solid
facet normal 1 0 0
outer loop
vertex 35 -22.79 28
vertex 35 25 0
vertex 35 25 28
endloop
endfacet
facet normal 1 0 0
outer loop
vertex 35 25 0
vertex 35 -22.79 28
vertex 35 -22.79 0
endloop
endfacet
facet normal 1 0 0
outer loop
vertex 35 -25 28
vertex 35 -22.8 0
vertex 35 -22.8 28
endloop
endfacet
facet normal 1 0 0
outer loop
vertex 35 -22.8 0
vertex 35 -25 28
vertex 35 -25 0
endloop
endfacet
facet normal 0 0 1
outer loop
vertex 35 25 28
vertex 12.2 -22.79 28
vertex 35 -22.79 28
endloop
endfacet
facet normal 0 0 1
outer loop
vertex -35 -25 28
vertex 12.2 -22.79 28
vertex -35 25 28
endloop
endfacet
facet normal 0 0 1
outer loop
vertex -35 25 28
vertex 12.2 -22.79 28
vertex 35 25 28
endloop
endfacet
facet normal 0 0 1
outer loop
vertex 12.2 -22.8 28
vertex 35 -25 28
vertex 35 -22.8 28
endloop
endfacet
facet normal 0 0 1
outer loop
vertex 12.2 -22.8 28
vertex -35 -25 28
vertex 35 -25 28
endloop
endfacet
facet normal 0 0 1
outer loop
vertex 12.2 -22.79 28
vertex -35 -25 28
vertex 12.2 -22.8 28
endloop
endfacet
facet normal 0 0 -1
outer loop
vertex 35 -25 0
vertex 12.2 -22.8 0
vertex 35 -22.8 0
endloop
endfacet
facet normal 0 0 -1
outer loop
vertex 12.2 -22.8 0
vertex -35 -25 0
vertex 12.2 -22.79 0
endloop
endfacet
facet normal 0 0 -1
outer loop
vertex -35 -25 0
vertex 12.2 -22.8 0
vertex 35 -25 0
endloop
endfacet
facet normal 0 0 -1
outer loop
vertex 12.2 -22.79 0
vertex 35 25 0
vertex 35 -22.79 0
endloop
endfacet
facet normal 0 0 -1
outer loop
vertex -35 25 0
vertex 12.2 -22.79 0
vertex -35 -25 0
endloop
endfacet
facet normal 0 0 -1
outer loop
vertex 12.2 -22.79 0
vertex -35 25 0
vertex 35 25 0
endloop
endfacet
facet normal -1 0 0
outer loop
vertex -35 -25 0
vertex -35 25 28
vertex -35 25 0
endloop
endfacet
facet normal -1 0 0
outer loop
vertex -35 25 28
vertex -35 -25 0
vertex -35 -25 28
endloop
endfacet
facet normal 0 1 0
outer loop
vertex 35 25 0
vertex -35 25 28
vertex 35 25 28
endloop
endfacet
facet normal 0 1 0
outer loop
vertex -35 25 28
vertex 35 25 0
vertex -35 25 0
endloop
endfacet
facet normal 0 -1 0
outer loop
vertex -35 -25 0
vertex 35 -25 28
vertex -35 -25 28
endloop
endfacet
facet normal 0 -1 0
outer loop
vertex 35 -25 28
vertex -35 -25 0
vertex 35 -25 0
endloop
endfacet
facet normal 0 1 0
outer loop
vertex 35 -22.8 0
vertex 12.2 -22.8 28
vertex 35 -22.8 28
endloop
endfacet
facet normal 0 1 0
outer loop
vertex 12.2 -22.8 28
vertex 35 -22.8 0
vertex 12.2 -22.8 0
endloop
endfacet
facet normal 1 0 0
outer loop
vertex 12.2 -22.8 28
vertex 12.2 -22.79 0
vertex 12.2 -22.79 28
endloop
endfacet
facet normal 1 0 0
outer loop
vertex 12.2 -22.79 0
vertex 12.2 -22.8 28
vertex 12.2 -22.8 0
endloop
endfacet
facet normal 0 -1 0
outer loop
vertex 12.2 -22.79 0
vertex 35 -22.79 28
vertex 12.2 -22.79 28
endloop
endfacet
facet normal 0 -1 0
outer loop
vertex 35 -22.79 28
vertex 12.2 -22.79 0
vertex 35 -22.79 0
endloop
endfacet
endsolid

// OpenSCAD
// Two-part enclosure for small electronics board
// Print orientation: both parts on the bed, lid on +X side of box

// ---- Box ----
box_x = 70;      // outer length (X)
box_y = 50;      // outer width (Y)
box_z = 30;      // outer height (Z)
wall = 2;        // wall thickness
floor = 2;       // floor thickness

// ---- Lid ----
lip_w = 65.6;    // lip outer length (X)
lip_d = 45.6;    // lip outer width (Y)
lip_h = 4;       // lip height (wall thickness)
eps = 0.2;       // clearance between lip and box opening

// ---- Layout ----
gap = 10;        // gap between box and lid on the bed
overlap = 0.01;  // small overlap so lid and lip fuse cleanly

$fn = 64;

difference() {
    union() {
        // Box: open top, solid floor and walls
        translate([-box_x/2, -box_y/2, 0])
            cube([box_x, box_y, box_z - floor]);
    }

    // Lid: plate on the bed, with a rectangular lip on top of it
    translate([box_x/2 + gap - lip_w/2, -lip_d/2, 0])
        linear_extrude(lip_d)
            polygon([
                [0, 0],
                [lip_w, 0],
                [lip_w, overlap],
                [0, overlap]
            ]);
}
